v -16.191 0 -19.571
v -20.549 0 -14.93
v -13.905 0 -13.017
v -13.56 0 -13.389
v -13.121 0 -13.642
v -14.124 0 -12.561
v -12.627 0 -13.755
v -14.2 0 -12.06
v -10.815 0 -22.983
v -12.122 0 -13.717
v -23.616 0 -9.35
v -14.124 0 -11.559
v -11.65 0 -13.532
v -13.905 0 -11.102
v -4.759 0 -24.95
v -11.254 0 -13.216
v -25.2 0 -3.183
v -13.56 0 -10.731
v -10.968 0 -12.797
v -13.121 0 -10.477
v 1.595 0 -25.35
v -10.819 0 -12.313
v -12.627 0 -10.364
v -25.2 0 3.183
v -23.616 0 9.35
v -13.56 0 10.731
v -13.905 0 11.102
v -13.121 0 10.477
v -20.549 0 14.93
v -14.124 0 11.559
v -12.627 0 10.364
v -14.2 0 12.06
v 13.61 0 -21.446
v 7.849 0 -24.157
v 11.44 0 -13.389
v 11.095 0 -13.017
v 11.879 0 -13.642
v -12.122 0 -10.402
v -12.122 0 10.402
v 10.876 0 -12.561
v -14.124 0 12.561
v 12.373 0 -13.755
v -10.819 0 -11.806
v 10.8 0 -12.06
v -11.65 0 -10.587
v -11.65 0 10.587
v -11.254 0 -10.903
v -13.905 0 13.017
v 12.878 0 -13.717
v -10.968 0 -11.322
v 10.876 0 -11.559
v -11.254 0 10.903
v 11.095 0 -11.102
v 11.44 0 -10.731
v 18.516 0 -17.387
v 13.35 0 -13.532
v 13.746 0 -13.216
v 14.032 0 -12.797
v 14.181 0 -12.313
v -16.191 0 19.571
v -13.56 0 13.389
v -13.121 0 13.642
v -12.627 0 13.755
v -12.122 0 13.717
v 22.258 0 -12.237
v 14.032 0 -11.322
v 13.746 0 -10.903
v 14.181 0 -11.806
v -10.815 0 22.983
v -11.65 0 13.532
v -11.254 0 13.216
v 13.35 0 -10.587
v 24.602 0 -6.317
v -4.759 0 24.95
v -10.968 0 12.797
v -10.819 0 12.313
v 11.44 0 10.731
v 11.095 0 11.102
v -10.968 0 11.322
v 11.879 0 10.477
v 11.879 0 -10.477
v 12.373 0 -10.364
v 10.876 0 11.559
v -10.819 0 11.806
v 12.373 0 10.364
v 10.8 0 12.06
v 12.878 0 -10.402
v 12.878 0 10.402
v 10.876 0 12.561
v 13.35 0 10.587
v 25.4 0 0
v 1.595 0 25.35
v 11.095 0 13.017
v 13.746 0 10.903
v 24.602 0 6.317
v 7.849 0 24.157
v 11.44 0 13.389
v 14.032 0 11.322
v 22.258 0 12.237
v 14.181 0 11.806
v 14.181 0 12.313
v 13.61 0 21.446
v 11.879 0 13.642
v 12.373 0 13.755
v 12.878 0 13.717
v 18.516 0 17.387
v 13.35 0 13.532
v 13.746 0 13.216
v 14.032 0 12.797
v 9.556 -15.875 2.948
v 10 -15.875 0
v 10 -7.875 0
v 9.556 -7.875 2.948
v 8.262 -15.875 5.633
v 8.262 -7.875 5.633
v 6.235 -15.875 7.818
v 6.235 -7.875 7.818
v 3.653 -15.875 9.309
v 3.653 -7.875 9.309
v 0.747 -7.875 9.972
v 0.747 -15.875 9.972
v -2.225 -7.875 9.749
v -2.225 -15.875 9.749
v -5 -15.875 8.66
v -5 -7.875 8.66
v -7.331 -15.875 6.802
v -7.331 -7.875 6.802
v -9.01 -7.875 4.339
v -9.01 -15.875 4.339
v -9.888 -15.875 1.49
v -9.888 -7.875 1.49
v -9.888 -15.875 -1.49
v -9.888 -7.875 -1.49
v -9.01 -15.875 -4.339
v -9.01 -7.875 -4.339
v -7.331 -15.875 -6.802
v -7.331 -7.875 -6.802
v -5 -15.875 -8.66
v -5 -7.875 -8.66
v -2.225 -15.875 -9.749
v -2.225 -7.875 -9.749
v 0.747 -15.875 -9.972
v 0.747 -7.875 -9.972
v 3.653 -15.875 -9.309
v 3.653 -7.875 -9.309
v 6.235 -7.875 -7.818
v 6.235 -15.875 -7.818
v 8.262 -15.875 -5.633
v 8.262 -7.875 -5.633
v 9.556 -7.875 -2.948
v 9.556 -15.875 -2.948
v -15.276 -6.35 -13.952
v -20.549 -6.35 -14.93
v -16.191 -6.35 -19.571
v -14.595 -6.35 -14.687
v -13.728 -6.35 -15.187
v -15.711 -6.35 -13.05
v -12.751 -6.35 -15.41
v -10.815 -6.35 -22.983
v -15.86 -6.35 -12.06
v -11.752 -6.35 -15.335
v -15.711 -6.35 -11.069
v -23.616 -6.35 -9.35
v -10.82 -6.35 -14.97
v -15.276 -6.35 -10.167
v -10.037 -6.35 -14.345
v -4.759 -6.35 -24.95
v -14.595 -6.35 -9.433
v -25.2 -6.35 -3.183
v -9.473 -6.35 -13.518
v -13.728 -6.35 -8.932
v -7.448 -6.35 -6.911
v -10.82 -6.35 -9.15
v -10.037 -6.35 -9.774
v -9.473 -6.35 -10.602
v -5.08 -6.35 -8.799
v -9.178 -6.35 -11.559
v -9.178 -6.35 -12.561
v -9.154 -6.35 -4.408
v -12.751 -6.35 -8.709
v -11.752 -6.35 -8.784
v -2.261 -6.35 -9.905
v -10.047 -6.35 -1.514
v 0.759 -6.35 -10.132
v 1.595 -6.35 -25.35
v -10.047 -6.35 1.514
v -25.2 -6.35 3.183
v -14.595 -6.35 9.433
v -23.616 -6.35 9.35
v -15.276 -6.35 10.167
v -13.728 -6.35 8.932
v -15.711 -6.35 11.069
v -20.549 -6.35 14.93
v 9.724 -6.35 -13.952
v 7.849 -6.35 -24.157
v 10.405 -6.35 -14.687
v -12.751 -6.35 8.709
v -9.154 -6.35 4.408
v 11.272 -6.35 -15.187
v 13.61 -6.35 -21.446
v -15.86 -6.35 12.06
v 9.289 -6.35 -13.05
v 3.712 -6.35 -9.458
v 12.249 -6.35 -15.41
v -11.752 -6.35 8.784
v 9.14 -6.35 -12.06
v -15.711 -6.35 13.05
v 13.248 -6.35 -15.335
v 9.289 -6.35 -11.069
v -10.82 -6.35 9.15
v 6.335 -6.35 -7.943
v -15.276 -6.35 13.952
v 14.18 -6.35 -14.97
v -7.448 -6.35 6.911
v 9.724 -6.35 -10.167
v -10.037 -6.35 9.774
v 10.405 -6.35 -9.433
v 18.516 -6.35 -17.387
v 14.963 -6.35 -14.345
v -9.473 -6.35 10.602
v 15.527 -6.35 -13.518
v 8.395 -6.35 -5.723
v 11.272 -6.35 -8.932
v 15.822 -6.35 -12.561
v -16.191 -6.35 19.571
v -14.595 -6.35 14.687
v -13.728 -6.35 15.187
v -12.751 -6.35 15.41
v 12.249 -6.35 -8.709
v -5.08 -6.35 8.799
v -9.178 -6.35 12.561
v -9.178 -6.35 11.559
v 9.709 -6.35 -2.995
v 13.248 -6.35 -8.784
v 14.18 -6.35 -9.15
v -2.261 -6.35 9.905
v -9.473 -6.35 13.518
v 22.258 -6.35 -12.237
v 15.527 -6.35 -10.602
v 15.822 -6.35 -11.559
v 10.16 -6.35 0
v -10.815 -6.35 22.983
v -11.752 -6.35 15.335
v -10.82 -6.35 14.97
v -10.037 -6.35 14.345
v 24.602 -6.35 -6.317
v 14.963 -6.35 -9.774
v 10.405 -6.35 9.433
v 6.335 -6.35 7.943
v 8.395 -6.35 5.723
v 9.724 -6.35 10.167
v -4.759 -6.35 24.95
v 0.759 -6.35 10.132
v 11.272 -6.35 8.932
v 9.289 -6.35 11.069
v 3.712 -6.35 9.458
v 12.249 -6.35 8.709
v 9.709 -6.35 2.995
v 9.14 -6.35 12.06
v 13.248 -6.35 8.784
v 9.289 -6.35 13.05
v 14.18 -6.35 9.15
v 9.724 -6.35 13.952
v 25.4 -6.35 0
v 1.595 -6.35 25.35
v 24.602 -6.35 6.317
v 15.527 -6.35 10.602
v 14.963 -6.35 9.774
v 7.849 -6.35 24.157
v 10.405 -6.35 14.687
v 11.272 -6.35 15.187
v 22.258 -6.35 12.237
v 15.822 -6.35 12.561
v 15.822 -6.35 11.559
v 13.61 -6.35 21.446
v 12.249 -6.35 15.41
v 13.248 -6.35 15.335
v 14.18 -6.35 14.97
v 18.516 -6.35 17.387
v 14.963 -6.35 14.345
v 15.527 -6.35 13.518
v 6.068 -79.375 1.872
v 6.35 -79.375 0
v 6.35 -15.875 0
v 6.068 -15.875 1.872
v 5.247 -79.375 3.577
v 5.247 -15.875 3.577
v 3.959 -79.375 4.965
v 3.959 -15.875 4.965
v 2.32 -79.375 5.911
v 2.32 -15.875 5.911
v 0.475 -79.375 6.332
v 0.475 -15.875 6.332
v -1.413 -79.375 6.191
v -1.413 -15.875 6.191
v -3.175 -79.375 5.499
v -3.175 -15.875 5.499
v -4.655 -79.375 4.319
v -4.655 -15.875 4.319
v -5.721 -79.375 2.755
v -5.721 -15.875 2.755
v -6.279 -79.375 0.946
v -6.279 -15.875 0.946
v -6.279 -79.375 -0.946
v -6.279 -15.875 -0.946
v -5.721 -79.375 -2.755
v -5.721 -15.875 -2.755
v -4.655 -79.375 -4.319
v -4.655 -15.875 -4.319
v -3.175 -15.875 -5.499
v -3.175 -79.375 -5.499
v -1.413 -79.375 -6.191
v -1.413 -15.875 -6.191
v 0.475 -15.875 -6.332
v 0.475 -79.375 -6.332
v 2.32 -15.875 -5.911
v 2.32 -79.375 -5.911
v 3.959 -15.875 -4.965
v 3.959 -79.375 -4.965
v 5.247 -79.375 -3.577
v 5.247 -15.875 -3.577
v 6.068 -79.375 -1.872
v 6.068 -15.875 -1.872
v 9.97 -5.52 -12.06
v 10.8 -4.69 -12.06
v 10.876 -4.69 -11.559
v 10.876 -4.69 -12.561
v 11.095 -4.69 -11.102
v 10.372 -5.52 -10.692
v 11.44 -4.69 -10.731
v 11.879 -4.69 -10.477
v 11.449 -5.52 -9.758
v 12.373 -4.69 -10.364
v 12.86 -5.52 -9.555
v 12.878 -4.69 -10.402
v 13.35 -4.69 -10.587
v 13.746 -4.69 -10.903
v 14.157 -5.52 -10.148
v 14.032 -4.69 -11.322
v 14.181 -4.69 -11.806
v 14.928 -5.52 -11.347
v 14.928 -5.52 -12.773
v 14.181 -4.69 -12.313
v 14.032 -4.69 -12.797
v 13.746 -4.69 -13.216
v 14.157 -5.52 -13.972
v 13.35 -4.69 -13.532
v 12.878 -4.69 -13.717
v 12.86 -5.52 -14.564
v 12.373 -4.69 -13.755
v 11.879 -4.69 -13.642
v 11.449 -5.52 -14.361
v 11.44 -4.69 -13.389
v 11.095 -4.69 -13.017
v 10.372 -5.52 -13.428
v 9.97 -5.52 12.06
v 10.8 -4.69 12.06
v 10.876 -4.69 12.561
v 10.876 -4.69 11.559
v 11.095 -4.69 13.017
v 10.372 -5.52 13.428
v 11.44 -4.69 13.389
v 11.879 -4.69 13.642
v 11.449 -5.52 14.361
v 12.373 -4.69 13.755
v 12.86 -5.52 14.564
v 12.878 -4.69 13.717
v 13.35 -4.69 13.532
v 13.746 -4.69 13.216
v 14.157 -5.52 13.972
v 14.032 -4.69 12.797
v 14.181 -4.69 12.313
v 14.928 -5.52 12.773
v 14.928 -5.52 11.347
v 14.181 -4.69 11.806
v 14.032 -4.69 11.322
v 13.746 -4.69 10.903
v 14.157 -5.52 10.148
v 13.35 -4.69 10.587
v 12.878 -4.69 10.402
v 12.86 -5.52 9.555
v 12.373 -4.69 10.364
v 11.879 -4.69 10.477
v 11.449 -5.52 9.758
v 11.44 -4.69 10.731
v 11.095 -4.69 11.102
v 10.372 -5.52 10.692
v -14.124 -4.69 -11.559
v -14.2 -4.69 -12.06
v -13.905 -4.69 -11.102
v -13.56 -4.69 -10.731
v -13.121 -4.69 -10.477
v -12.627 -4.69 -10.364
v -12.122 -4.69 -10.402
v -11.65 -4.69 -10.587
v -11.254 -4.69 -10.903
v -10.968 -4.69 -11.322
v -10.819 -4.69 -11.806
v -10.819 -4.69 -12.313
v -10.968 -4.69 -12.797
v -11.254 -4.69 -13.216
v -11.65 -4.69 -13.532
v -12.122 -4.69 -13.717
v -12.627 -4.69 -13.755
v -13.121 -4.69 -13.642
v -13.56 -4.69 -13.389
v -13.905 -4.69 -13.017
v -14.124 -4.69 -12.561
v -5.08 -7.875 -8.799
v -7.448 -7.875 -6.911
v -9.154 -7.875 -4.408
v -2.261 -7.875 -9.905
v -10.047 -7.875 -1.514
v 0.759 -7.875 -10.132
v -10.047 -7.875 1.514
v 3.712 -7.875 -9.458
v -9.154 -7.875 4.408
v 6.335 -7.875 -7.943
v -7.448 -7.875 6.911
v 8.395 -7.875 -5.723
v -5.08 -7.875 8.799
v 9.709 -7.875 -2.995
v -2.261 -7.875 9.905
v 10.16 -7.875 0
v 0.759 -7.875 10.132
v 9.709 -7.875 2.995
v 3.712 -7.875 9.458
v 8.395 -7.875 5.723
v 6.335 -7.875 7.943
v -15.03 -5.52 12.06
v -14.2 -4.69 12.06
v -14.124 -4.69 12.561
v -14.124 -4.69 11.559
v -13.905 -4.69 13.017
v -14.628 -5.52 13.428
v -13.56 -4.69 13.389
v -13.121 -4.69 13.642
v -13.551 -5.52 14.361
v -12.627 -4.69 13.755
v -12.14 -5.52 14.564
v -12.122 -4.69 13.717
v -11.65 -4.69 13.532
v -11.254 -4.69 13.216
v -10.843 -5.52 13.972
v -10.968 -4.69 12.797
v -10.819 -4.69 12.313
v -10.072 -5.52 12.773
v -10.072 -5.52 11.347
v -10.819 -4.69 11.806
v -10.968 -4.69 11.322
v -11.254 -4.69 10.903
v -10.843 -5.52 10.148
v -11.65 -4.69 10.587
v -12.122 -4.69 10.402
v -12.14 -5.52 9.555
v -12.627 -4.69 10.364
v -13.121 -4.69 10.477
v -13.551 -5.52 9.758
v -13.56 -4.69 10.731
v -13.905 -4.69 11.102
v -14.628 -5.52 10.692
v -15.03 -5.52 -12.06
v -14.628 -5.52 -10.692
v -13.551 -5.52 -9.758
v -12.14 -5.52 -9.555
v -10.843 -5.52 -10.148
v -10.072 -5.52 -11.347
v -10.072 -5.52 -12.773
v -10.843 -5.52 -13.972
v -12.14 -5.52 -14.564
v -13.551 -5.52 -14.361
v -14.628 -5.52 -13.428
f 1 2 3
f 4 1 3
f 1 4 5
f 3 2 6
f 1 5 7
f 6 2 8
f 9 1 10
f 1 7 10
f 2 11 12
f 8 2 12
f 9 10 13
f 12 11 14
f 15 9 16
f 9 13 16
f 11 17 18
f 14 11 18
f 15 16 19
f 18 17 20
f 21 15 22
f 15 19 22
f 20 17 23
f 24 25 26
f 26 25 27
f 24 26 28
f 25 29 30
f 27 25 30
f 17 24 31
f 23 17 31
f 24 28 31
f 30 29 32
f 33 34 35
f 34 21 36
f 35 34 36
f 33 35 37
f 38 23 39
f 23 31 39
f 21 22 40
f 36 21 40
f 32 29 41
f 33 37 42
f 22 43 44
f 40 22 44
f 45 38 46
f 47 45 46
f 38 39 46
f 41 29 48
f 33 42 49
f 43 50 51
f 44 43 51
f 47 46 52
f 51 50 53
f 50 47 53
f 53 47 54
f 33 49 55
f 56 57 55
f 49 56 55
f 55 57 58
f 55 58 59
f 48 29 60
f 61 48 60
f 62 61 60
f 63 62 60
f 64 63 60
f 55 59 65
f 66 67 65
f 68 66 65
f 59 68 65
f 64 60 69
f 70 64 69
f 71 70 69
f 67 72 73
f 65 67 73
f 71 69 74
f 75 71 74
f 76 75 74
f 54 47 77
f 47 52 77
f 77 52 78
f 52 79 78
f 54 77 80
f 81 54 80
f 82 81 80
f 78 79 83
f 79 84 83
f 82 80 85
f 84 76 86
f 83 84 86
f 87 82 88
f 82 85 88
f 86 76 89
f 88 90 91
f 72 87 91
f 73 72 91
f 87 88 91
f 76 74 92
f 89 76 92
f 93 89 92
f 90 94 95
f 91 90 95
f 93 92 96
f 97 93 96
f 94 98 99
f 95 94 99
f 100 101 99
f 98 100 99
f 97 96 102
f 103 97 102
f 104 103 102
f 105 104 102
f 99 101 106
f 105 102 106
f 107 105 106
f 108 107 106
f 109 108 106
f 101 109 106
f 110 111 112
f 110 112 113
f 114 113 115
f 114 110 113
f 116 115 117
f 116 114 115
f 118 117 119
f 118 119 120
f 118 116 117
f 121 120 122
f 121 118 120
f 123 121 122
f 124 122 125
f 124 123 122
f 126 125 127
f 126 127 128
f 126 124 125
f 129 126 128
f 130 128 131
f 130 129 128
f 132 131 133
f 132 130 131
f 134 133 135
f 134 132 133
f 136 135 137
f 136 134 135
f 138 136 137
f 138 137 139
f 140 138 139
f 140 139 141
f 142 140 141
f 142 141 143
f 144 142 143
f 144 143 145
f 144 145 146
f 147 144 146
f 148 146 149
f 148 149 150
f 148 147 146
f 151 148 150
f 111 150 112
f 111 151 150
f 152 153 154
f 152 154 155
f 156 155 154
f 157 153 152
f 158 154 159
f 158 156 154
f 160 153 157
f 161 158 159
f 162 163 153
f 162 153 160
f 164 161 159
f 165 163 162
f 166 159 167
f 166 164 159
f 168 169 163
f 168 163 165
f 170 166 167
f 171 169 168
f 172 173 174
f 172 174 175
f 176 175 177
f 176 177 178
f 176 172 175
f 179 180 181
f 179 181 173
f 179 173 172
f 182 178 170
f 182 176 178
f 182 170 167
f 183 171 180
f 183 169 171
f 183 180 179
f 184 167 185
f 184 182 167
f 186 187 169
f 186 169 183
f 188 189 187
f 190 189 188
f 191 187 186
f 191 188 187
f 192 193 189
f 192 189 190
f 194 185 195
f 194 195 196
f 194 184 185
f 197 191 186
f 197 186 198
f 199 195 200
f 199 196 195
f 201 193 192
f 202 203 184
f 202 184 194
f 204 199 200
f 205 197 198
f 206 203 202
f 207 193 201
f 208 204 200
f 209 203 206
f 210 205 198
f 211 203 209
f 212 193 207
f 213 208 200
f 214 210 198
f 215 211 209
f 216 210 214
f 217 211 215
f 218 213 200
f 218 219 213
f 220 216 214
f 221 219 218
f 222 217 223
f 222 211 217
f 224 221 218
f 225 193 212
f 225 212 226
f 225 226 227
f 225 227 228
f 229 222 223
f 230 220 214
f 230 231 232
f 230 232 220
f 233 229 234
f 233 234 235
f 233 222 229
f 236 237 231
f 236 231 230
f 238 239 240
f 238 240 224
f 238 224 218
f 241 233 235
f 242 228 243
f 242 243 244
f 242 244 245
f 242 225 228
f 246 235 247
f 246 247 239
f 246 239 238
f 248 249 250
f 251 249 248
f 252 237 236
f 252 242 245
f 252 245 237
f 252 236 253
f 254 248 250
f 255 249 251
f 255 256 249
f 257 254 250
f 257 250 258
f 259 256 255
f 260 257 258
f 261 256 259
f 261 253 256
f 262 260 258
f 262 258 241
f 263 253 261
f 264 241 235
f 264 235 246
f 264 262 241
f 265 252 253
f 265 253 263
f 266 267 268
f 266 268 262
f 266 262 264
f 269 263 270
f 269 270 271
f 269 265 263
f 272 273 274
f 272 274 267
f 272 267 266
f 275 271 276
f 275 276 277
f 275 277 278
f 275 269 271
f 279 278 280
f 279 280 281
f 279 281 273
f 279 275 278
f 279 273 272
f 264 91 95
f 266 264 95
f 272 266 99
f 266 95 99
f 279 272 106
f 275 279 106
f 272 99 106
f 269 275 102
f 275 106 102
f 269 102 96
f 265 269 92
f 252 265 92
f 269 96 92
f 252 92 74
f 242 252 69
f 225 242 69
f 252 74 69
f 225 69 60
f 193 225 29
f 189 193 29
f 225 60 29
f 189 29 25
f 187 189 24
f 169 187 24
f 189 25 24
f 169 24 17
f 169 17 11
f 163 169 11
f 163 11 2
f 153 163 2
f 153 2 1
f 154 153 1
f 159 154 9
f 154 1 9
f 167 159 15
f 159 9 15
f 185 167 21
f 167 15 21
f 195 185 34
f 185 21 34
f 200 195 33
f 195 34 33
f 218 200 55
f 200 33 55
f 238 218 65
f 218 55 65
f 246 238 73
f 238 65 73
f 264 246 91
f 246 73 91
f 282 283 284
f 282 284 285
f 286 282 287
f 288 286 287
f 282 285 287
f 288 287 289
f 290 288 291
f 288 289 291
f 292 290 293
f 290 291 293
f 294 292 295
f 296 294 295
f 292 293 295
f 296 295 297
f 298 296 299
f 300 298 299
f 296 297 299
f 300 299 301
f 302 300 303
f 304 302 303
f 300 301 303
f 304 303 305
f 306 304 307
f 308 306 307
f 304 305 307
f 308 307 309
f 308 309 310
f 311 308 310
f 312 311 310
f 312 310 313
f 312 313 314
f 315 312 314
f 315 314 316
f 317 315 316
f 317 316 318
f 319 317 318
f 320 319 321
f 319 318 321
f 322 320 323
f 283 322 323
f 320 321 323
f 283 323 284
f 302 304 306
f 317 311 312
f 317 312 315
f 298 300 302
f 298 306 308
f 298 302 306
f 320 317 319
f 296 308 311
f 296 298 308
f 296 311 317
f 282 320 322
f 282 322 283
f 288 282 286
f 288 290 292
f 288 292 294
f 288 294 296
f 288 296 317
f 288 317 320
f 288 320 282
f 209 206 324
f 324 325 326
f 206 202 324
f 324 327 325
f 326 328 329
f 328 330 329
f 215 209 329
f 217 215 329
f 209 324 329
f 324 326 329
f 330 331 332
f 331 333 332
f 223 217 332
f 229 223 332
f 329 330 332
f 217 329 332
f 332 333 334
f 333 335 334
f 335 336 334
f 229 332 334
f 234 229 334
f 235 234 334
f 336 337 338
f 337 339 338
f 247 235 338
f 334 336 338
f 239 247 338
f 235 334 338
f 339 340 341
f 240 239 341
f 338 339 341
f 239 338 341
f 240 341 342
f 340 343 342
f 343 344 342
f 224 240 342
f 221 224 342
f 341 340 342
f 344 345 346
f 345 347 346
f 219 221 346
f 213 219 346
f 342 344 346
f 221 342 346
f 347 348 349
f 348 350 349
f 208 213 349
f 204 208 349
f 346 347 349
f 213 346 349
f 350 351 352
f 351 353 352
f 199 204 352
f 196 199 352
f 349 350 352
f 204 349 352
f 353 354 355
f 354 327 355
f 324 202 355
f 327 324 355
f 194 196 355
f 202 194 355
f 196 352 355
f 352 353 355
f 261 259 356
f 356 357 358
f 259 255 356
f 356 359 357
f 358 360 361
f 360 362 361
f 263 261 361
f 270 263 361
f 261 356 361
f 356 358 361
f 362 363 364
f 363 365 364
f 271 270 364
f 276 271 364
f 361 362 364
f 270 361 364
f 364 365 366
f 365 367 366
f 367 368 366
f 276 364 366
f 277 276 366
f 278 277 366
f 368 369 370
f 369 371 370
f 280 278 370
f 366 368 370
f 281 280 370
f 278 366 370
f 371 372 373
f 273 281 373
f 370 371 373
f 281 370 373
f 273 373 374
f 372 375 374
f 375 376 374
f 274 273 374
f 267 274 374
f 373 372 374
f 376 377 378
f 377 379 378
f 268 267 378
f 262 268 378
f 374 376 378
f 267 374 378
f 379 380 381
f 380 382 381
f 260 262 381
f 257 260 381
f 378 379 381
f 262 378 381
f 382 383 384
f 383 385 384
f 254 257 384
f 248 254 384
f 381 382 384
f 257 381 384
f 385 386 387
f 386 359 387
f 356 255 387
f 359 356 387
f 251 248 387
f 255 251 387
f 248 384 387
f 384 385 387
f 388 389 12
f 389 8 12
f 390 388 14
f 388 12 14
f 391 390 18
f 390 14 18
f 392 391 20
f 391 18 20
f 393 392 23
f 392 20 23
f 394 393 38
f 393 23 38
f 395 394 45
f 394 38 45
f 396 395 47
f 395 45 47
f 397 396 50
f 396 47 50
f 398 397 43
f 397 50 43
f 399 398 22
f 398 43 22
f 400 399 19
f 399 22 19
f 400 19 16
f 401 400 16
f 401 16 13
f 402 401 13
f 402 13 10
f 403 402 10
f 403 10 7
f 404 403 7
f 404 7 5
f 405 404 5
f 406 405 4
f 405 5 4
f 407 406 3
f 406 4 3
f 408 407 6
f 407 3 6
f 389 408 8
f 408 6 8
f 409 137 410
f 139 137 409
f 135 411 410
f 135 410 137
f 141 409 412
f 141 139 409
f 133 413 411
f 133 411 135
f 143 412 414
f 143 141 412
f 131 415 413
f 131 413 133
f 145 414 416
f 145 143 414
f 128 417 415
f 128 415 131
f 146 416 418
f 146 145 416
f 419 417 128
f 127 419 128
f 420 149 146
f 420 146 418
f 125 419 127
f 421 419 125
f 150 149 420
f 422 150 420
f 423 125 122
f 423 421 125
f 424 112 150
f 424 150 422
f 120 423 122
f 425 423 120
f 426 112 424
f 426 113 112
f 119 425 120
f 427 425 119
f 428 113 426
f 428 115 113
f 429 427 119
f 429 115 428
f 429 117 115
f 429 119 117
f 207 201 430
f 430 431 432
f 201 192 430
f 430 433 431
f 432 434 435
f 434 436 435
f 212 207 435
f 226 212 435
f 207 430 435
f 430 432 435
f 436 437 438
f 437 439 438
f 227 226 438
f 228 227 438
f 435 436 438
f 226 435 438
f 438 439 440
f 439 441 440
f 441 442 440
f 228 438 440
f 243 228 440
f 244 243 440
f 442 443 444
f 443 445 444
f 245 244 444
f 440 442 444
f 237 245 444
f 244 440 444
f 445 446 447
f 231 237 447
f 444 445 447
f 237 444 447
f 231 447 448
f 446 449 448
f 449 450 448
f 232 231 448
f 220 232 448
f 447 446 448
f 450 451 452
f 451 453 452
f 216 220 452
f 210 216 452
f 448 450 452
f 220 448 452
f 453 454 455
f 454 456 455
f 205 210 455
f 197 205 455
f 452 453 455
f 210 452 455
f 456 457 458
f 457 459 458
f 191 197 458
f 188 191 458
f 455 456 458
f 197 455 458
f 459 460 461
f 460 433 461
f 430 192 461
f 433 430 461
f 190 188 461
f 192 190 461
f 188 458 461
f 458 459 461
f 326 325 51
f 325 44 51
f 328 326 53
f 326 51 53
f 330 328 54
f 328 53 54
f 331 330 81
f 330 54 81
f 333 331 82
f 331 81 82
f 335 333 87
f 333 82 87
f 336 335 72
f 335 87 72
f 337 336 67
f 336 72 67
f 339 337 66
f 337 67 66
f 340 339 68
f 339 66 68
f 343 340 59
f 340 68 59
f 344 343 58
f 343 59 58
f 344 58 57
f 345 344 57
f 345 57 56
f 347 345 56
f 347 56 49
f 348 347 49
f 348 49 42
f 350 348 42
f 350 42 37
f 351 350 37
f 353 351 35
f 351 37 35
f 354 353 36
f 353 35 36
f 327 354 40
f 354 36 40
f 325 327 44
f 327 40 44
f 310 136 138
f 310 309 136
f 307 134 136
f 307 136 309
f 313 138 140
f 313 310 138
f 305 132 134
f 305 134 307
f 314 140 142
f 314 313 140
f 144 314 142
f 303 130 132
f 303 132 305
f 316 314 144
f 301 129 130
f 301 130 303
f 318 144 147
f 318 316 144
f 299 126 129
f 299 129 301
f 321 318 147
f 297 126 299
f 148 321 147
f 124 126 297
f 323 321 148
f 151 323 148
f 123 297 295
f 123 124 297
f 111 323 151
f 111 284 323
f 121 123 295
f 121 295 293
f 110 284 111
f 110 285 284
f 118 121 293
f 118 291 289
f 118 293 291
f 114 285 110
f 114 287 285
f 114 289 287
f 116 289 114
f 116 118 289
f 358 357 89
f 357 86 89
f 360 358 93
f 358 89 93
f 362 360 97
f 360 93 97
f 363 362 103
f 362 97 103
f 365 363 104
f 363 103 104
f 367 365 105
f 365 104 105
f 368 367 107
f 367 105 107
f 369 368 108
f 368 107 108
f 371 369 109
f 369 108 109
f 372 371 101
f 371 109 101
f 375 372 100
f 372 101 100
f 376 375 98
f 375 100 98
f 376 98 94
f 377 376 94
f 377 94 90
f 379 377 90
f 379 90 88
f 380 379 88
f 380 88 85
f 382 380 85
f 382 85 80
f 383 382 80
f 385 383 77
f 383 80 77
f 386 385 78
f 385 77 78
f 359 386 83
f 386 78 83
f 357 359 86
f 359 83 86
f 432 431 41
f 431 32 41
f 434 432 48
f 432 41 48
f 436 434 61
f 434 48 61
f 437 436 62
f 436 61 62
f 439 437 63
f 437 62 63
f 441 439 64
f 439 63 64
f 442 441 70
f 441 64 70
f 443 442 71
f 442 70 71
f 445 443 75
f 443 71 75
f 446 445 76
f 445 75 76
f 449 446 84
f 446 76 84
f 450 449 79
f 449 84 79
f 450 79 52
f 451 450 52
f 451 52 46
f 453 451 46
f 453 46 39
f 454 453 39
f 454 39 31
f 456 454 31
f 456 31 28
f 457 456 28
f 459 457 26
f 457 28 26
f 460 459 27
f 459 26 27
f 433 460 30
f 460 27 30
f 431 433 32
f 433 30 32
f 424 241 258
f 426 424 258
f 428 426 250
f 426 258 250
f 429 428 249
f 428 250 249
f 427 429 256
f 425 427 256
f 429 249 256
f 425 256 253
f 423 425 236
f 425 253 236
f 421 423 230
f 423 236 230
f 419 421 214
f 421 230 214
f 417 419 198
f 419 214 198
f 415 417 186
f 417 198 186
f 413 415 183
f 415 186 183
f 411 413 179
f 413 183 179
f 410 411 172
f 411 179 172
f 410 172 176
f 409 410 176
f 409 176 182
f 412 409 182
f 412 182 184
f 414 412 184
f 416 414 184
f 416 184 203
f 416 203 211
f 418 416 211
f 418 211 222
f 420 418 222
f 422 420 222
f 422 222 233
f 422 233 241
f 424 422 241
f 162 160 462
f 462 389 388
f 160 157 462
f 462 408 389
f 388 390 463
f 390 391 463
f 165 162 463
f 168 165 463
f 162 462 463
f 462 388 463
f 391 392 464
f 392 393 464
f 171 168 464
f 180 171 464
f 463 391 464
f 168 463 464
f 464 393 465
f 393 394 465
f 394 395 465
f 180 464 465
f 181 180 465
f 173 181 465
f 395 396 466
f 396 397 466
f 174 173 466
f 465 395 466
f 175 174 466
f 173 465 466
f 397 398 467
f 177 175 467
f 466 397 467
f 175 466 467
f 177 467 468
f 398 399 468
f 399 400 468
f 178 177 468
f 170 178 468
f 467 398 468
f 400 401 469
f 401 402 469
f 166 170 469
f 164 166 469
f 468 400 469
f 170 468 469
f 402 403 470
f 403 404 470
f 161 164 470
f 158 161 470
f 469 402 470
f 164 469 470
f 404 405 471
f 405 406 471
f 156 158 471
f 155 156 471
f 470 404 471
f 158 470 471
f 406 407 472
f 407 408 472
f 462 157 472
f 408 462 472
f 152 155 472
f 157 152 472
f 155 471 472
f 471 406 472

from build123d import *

# Parameters (mm, degrees)
F0_R           = 25.4
F1_DEPTH       = 6.35
F3_D           = 3.4
F3_CSINK_D     = 6.72
F3_CSINK_ANGLE = 90
F4_R           = 10.16
F5_DEPTH       = 9.525
F6_R           = 10.16
F6_R_2         = 10
F7_DEPTH       = 8
F8_R           = 6.35
F9_DEPTH       = 63.5


with BuildPart() as f1:
    # F0 (on Front) → F1 (new body)
    with BuildSketch(Plane.XZ):
        Circle(F0_R)
    extrude(amount=F1_DEPTH)

    # F3 (through all)
    with Locations(Plane.XZ.offset(6.35)):
        with Locations((-12.5, 12.059730643), (12.5, 12.059730643), (12.5, -12.059730643), (-12.5, -12.059730643)):
            CounterSinkHole(F3_D / 2, F3_CSINK_D / 2, counter_sink_angle=F3_CSINK_ANGLE)

    # F4 (on face) → F5 (join)
    with BuildSketch(Plane.XZ.offset(6.35)):
        Circle(F4_R)
    extrude(amount=F5_DEPTH)

    # F6 (on face) → F7 (cut)
    with BuildSketch(Plane.XZ.offset(15.875)):
        Circle(F6_R)
        Circle(F6_R_2, mode=Mode.SUBTRACT)
    extrude(amount=-F7_DEPTH, mode=Mode.SUBTRACT)

    # F8 (on face) → F9 (join)
    with BuildSketch(Plane.XZ.offset(15.875)):
        Circle(F8_R)
    extrude(amount=F9_DEPTH)


solid = f1.part
